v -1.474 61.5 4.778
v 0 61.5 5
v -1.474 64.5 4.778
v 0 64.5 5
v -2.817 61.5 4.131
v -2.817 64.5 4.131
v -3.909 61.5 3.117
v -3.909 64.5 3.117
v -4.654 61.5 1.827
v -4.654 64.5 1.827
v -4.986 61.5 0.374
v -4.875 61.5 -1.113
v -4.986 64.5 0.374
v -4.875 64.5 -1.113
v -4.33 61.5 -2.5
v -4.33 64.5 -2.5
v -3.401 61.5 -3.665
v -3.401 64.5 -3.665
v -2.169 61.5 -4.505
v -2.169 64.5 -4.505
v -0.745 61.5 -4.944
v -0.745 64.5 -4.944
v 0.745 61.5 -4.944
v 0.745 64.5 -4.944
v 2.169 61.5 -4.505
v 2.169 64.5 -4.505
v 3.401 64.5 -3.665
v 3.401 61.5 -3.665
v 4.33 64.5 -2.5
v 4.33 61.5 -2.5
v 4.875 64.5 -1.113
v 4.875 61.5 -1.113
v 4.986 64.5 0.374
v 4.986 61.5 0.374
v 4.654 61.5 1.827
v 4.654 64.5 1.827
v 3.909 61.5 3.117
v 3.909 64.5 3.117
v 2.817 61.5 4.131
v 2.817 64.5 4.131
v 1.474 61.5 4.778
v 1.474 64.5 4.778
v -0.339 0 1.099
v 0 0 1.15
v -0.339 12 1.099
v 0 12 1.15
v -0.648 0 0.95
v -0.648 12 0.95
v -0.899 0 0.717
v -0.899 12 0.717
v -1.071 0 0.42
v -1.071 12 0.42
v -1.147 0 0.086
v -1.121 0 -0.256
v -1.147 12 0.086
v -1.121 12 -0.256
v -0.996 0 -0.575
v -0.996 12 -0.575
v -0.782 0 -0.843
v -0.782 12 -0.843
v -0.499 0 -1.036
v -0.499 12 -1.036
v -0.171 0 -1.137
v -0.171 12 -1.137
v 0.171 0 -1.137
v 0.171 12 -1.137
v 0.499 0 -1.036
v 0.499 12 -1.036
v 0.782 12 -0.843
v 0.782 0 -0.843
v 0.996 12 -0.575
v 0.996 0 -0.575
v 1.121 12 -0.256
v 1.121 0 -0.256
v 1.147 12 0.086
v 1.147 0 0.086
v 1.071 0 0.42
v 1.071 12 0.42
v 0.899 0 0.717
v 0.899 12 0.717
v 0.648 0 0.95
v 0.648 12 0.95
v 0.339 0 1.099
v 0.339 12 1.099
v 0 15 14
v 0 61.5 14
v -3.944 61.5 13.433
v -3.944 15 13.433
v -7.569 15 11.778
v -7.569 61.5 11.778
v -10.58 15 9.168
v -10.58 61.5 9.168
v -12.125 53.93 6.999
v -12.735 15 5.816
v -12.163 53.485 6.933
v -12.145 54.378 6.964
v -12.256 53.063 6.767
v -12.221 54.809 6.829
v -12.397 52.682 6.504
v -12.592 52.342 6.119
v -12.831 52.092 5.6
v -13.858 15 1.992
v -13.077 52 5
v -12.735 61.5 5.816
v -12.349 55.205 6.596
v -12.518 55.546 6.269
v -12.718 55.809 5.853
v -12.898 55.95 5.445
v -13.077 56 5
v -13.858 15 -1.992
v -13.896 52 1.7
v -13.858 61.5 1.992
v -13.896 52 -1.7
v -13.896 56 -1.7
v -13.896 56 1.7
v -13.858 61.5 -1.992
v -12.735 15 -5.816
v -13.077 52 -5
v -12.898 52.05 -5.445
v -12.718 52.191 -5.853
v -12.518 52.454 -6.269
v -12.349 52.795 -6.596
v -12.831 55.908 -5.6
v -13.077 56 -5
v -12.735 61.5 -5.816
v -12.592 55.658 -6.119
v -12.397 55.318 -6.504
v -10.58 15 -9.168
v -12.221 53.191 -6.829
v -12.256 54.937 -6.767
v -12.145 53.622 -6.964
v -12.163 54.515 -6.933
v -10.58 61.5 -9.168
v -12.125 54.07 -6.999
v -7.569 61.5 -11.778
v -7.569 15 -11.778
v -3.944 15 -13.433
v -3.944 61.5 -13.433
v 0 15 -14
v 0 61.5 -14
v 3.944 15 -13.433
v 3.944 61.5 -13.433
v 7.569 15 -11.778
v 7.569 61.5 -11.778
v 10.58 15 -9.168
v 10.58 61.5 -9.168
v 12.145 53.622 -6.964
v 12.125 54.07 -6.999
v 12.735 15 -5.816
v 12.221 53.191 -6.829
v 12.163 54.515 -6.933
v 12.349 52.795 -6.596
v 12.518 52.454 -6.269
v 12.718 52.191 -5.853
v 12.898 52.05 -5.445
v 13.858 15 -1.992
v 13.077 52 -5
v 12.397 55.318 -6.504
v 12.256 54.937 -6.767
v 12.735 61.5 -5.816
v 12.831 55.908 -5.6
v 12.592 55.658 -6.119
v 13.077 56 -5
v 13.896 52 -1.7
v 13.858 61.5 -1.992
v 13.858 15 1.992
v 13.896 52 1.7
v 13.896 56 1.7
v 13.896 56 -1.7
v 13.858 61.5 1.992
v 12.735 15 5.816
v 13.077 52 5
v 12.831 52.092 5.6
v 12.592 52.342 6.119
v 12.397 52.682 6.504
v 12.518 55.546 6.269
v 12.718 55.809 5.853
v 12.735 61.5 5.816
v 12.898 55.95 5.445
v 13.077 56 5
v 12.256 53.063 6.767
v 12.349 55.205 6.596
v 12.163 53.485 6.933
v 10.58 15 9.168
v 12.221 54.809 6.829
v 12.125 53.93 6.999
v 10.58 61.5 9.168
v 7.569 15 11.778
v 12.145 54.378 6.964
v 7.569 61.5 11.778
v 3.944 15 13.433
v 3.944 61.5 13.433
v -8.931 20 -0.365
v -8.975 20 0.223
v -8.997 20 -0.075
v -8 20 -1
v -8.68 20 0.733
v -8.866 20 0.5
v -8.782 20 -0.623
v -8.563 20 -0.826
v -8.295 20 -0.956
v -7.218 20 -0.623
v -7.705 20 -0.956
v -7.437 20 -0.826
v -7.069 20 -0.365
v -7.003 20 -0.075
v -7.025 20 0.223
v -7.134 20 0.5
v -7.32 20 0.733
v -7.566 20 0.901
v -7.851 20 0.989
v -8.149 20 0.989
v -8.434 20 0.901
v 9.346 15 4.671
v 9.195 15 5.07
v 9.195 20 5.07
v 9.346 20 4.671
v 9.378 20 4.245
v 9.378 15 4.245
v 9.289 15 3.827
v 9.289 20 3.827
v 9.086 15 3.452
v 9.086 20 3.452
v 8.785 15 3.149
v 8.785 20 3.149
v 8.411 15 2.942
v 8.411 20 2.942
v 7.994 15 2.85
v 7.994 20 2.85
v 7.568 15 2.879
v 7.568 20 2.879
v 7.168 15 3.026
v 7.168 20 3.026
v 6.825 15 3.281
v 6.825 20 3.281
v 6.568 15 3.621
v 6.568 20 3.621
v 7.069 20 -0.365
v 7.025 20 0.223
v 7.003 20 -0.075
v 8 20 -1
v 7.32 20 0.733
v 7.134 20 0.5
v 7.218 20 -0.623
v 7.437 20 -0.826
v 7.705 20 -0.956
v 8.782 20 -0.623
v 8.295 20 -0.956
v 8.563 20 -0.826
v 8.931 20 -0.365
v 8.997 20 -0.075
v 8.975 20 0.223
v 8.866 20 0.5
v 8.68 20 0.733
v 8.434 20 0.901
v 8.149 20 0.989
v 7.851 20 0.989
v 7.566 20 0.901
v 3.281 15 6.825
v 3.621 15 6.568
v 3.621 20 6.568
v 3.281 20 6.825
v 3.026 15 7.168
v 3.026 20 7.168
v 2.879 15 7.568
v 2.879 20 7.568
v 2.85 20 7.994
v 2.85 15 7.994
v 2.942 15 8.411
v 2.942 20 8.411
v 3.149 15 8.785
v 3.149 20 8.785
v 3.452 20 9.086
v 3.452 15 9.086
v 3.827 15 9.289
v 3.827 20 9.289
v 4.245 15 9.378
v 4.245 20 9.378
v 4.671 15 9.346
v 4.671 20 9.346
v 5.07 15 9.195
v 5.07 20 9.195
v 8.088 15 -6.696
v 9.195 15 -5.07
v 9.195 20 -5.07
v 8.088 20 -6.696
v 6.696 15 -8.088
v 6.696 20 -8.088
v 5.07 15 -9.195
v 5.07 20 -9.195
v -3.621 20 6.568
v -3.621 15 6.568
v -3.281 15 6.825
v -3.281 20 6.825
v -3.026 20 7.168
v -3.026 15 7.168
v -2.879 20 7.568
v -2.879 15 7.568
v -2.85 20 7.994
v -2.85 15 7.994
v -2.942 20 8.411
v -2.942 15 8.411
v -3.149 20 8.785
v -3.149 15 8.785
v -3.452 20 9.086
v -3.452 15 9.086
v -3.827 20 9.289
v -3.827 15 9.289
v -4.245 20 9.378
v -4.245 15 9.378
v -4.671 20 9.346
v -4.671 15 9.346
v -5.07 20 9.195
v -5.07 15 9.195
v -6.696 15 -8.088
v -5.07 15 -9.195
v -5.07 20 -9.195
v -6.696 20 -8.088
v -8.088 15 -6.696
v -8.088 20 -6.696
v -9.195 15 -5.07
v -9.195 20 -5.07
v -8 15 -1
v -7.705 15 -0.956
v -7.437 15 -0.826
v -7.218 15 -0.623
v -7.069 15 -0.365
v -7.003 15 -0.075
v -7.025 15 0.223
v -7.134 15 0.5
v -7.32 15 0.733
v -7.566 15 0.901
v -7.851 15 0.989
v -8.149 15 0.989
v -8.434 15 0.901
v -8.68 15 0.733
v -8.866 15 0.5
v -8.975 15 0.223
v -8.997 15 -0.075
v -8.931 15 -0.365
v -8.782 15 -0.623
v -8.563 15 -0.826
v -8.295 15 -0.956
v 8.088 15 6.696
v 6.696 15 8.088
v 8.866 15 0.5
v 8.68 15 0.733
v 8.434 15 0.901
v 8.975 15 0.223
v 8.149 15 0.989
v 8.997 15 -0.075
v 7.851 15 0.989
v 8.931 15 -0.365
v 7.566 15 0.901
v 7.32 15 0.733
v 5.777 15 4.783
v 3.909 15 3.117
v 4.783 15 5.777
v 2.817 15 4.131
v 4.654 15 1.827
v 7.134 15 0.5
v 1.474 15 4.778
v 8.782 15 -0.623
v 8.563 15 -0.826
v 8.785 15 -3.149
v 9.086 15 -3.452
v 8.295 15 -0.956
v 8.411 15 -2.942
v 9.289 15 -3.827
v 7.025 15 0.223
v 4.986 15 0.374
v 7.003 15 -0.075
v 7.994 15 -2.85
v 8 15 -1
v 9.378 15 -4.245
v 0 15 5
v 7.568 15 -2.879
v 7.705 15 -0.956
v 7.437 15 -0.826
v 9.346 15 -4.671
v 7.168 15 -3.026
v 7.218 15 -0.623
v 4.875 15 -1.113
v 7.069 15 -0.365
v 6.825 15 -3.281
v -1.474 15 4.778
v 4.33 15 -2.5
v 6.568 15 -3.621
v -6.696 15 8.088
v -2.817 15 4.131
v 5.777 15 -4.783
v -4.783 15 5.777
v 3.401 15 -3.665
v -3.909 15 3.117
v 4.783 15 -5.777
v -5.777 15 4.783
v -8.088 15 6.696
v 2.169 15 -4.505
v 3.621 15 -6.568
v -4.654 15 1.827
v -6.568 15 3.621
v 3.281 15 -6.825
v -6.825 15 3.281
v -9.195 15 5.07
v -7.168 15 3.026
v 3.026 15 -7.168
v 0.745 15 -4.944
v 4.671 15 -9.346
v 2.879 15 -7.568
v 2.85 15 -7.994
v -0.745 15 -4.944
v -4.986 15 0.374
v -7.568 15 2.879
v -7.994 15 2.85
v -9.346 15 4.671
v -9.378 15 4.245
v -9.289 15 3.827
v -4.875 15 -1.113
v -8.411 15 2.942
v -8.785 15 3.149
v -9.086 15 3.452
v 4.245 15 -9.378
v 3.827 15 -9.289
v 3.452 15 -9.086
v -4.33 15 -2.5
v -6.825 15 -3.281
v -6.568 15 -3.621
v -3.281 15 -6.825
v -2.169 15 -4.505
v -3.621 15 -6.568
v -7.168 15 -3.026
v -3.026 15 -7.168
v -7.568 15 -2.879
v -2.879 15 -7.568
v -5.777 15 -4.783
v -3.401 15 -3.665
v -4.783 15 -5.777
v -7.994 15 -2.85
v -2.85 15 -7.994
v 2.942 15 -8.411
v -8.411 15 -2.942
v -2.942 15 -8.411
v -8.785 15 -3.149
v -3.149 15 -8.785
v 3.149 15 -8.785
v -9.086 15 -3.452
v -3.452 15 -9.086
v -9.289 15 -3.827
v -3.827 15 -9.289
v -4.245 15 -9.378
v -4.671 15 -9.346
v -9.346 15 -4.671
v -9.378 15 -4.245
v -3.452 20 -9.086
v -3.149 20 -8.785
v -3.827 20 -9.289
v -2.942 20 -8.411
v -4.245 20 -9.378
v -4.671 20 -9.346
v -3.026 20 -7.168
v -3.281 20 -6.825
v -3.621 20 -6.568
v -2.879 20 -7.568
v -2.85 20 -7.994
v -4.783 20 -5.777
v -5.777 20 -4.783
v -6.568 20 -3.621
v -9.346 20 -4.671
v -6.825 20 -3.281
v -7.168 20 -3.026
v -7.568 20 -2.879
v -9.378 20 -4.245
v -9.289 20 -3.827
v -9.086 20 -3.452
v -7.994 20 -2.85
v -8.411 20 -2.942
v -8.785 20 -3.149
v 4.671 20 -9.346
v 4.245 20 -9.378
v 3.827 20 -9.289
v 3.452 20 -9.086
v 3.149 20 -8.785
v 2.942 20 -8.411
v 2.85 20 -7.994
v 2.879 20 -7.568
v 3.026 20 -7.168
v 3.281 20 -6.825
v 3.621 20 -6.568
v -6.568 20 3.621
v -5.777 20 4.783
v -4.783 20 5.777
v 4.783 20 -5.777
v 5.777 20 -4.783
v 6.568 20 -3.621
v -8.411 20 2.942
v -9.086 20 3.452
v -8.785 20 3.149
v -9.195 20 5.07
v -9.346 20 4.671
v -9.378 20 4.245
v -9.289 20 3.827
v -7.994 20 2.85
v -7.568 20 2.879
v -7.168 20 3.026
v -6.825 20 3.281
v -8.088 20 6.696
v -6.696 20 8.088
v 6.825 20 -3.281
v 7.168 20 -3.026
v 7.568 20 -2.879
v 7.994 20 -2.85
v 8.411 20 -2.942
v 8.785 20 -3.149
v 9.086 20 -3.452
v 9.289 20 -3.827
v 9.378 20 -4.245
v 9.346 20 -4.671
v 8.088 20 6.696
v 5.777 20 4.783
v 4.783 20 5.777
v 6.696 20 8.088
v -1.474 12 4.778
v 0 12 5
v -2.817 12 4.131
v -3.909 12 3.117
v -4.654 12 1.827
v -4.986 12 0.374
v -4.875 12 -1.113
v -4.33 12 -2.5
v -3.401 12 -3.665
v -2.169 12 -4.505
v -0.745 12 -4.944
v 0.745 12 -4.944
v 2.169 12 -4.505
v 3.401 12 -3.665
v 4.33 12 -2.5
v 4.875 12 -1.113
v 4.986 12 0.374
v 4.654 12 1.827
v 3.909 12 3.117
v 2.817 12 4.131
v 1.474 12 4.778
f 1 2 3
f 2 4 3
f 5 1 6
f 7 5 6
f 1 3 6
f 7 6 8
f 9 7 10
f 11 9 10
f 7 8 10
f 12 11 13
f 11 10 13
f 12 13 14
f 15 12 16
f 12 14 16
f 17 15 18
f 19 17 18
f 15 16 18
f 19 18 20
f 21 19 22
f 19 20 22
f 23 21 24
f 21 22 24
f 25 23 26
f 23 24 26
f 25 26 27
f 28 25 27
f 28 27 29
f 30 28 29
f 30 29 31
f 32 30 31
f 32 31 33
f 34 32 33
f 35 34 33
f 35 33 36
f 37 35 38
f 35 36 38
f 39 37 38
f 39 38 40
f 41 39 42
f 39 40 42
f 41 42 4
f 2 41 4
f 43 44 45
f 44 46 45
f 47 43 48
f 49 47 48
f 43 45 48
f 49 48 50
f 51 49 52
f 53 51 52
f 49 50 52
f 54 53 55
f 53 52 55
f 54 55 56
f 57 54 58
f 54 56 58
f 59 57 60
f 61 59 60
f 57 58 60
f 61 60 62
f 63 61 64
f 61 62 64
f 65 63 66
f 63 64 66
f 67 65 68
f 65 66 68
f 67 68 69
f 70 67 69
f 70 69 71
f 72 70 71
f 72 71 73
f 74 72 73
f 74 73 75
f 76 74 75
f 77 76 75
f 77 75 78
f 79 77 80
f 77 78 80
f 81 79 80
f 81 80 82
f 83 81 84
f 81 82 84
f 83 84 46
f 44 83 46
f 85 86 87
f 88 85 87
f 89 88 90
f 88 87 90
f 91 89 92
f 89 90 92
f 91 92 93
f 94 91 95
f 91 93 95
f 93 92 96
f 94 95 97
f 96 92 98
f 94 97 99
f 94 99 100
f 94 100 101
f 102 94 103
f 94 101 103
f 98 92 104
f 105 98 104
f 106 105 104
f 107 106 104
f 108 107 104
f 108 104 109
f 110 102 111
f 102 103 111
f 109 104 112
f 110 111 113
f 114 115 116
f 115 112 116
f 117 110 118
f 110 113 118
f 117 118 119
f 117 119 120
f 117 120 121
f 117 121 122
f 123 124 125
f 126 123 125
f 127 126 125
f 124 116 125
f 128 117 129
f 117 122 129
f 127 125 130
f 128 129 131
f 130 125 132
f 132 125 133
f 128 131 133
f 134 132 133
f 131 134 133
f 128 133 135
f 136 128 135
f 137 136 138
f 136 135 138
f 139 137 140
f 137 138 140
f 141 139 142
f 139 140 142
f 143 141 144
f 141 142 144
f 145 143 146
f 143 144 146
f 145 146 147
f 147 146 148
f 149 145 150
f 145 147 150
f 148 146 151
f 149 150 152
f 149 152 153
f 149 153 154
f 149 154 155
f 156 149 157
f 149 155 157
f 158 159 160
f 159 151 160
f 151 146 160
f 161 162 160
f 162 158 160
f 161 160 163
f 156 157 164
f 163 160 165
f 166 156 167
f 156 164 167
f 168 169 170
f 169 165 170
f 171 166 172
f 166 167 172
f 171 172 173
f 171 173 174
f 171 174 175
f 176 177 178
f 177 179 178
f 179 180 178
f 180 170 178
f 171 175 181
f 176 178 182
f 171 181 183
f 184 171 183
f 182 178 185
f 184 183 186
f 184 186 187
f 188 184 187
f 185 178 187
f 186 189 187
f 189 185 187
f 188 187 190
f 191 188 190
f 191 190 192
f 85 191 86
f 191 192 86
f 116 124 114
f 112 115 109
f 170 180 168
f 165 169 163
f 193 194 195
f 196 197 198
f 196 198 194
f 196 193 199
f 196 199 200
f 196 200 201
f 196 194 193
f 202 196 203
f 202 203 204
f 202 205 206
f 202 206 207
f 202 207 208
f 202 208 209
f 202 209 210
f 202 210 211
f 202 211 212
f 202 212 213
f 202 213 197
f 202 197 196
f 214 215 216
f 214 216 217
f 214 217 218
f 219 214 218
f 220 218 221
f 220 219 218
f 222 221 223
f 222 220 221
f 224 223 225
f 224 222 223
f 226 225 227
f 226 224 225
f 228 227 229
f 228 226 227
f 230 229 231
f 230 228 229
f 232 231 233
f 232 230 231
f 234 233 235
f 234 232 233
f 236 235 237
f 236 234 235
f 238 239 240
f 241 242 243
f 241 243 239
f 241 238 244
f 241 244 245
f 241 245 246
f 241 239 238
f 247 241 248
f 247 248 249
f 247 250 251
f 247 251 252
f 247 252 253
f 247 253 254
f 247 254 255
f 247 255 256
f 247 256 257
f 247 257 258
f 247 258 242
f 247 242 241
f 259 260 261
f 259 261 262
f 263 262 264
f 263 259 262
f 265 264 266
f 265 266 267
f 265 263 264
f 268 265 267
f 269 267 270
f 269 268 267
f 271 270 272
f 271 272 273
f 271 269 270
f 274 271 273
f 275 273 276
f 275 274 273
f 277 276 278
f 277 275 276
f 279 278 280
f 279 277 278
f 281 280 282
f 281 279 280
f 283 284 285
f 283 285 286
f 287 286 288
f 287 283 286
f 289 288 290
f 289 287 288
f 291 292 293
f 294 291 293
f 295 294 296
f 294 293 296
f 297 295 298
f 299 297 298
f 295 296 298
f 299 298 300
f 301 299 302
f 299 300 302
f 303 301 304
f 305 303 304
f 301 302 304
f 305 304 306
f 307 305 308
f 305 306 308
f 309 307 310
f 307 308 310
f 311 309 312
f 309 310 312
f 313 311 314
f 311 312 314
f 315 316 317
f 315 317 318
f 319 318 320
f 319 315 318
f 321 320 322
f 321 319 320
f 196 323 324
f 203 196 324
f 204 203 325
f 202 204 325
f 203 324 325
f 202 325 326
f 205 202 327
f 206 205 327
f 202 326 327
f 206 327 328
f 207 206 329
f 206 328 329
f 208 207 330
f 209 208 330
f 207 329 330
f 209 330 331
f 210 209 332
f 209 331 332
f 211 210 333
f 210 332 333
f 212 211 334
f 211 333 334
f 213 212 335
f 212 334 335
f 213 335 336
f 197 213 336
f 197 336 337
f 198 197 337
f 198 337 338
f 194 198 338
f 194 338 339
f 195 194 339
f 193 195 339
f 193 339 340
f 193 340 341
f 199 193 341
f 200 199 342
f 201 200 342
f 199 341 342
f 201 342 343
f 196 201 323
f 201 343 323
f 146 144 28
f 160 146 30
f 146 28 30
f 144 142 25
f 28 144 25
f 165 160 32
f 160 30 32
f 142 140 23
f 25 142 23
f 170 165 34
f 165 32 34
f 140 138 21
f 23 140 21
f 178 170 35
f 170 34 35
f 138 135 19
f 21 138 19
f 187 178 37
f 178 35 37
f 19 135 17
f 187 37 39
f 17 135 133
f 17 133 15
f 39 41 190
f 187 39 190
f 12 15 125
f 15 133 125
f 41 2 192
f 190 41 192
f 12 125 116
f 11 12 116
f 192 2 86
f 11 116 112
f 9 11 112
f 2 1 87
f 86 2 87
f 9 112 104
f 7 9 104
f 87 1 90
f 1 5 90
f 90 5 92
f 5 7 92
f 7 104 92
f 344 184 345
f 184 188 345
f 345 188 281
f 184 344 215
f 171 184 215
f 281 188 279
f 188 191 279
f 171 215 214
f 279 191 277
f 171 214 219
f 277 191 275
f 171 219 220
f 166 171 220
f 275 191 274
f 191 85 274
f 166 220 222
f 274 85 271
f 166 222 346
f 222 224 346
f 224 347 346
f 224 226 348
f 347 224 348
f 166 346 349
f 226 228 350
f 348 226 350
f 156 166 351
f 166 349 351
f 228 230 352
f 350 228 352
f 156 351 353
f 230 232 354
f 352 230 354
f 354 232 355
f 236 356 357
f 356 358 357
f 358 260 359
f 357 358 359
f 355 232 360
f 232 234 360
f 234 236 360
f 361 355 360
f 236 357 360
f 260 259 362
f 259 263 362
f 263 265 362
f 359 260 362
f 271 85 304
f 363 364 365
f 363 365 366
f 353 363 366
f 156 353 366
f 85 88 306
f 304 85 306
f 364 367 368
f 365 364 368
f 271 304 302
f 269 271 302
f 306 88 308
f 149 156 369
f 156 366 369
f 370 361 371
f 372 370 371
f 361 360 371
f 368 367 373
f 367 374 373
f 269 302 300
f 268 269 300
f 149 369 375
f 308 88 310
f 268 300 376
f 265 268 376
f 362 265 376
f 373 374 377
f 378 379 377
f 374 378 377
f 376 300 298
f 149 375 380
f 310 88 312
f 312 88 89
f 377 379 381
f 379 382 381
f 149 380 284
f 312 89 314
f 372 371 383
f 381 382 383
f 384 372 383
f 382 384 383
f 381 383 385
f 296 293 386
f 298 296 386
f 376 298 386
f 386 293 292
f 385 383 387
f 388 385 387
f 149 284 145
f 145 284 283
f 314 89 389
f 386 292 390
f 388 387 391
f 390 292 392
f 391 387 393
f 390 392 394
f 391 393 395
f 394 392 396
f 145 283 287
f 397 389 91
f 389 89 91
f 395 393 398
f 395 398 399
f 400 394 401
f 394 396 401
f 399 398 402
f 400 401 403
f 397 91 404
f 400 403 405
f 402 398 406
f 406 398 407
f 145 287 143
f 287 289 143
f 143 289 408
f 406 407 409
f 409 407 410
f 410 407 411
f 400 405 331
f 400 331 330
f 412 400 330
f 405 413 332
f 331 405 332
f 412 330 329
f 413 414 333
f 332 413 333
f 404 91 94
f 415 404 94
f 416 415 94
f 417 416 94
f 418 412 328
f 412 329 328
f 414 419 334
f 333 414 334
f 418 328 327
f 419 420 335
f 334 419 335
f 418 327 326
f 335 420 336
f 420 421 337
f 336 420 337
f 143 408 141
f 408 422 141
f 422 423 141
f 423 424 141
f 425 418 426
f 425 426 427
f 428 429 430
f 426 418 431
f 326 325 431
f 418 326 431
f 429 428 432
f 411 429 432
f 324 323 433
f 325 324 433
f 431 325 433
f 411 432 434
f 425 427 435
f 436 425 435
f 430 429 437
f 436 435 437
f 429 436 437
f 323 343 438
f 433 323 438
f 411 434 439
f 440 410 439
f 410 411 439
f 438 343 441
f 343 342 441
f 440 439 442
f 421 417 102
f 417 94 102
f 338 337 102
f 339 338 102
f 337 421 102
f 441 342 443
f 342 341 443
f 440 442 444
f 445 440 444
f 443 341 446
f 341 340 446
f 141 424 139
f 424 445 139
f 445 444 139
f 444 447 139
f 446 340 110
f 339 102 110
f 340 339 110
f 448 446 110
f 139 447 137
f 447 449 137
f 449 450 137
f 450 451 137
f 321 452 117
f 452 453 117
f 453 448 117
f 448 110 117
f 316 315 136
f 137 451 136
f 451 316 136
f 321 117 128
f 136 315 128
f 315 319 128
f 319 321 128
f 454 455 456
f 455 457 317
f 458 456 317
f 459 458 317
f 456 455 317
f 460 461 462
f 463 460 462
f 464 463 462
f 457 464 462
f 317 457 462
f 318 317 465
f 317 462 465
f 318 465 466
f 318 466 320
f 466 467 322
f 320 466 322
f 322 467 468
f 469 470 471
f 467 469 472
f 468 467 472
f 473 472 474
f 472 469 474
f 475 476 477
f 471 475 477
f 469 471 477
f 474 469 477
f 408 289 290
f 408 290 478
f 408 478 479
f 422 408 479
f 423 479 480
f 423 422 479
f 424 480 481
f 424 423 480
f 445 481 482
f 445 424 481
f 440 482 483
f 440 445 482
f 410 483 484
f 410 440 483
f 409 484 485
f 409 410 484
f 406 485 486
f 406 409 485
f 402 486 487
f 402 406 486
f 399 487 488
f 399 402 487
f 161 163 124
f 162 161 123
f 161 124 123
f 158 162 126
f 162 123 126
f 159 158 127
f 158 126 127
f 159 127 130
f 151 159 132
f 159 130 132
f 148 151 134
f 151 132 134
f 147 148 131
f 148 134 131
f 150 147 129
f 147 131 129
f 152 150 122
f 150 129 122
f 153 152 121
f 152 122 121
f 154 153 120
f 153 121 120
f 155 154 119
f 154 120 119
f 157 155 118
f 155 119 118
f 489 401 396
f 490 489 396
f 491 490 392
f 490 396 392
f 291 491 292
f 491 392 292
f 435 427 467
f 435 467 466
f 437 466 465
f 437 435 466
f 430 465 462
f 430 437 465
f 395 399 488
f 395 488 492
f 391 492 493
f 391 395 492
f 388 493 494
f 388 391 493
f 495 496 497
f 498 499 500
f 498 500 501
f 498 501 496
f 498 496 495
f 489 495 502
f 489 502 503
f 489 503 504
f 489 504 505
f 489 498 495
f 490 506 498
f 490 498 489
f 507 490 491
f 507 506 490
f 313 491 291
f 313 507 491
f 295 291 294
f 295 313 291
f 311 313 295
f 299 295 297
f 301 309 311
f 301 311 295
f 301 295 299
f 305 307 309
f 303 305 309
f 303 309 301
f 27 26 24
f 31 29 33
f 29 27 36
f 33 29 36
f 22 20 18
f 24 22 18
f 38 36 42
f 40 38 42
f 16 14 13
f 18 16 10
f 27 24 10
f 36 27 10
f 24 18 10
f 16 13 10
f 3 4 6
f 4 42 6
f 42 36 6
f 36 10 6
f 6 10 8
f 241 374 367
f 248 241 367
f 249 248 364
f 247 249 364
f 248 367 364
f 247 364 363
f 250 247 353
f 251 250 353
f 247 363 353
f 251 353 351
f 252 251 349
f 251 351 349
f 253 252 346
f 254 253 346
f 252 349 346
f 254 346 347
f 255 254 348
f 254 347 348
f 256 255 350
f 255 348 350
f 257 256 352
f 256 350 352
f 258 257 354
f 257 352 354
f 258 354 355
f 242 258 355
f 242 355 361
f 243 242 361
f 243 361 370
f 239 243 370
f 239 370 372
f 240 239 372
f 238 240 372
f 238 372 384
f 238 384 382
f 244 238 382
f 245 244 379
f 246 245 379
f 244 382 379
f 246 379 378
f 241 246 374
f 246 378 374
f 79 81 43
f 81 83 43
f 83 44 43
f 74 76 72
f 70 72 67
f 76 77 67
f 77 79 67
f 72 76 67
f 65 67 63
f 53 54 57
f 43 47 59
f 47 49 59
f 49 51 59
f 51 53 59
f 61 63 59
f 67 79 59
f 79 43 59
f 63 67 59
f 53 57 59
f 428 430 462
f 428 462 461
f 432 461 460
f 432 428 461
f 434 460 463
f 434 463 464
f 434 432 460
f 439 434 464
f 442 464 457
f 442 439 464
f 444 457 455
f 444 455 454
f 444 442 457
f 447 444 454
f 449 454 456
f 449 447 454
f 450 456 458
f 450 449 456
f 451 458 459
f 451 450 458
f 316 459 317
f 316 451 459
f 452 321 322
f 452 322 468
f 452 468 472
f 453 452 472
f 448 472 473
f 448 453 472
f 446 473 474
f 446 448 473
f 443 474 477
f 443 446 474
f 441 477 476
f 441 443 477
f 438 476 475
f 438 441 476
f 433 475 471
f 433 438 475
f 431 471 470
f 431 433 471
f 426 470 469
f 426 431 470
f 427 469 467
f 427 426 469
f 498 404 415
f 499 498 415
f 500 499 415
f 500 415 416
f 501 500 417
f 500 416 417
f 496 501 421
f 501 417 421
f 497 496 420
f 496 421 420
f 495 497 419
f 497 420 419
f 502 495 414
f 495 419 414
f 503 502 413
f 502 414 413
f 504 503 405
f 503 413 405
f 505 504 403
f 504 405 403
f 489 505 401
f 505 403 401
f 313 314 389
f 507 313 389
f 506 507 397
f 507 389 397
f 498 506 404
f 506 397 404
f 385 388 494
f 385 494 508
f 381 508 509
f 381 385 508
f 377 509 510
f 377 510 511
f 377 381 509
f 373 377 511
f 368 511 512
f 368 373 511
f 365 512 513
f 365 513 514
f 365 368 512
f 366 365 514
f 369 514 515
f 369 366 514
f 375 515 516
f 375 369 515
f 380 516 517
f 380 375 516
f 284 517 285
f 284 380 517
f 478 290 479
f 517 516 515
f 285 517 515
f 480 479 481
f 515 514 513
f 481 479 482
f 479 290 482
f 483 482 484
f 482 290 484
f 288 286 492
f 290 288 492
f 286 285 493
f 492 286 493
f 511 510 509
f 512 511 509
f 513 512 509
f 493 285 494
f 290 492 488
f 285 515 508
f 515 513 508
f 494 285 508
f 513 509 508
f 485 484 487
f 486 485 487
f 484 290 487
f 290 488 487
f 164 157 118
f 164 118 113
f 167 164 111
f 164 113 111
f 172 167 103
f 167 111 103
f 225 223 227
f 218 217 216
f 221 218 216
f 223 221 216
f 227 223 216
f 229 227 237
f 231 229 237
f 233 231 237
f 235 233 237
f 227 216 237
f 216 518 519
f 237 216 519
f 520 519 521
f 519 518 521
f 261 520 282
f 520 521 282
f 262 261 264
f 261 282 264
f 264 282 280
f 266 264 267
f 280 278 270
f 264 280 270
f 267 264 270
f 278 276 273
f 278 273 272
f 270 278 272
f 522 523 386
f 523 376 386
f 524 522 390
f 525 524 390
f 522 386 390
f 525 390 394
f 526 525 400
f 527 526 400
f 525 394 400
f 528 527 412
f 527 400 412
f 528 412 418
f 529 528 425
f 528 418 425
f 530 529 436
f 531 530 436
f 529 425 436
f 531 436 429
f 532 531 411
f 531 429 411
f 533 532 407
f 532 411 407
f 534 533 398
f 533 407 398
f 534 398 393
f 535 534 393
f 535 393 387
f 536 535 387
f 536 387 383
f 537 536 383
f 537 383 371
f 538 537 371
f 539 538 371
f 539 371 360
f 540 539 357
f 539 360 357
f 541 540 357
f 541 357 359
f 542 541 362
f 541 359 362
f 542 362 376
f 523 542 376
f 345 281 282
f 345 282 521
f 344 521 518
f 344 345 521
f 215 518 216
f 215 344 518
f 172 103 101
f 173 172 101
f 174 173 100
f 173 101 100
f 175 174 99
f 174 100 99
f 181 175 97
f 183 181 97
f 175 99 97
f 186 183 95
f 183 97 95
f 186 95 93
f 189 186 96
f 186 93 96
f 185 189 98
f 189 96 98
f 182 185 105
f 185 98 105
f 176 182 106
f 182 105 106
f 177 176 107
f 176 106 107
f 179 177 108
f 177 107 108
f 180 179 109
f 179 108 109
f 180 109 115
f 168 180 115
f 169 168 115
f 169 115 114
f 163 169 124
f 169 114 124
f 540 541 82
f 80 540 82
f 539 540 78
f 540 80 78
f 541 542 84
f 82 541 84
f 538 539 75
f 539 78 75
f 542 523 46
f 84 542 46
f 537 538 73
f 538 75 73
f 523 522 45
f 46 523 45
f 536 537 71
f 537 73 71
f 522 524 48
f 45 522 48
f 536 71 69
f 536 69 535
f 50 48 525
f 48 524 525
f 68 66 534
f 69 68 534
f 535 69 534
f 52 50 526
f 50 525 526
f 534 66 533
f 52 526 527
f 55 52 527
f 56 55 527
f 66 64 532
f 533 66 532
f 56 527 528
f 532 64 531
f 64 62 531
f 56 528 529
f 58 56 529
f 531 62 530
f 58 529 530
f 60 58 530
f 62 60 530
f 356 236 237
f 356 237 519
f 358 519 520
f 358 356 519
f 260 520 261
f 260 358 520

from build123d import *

# Parameters (mm, degrees)
SKETCH2_R               = 1
CUT_EXTRUDE1_DEPTH      = 5
CUT_EXTRUDE2_DEPTH      = 5
CUT_EXTRUDE3_DEPTH      = 68.470363864
CUT_EXTRUDE3_DEPTH_BACK = 68.470363864


with BuildPart() as part:
    # Sketch1 → Revolve1 (revolve)
    with BuildSketch(Plane(origin=(0, 0, 0), x_dir=(0, 0, -1), z_dir=(1, 0, 0)), mode=Mode.PRIVATE) as revolve1_sk:
        Polygon((0, 0), (1.15, 0), (1.15, 12), (5, 12), (5, 15), (14, 15), (14, 61.5), (5, 61.5), (5, 64.5), (0, 64.5), align=None)
    revolve(revolve1_sk.sketch.rotate(Axis((0, 64.5, 0), (0, -1, 0)), 180), axis=Axis((0, 64.5, 0), (0, -1, 0)))

    # Sketch2 → Cut-Extrude1 (cut)
    with BuildSketch(Plane.XZ.offset(-15)):
        with Locations(Location((-8, 0, 0), (0, 0, 270))):
            Circle(SKETCH2_R)
        with Locations(Location((8, 0, 0), (0, 0, 270))):
            Circle(SKETCH2_R)
    extrude(amount=-CUT_EXTRUDE1_DEPTH, mode=Mode.SUBTRACT)

    # Sketch3 → Cut-Extrude2 (cut)
    with BuildSketch(Plane.XZ.offset(-15)):
        with BuildLine():
            ThreePointArc((-5.070033124, 9.19482268), (-7.424621202, 7.424621202), (-9.19482268, 5.070033124))
            ThreePointArc((-9.19482268, 5.070033124), (-8.60556703, 3.03219658), (-6.567730486, 3.621452231))
            ThreePointArc((-6.567730486, 3.621452231), (-5.303300859, 5.303300859), (-3.621452231, 6.567730486))
            ThreePointArc((-3.621452231, 6.567730486), (-3.03219658, 8.60556703), (-5.070033124, 9.19482268))
        make_face()
        with BuildLine():
            ThreePointArc((6.567730486, 3.621452231), (5.303300859, 5.303300859), (3.621452231, 6.567730486))
            ThreePointArc((3.621452231, 6.567730486), (3.03219658, 8.60556703), (5.070033124, 9.19482268))
            ThreePointArc((5.070033124, 9.19482268), (7.424621202, 7.424621202), (9.19482268, 5.070033124))
            ThreePointArc((9.19482268, 5.070033124), (8.60556703, 3.03219658), (6.567730486, 3.621452231))
        make_face()
        with BuildLine():
            ThreePointArc((3.621452231, -6.567730486), (5.303300859, -5.303300859), (6.567730486, -3.621452231))
            ThreePointArc((6.567730486, -3.621452231), (8.60556703, -3.03219658), (9.19482268, -5.070033124))
            ThreePointArc((9.19482268, -5.070033124), (7.424621202, -7.424621202), (5.070033124, -9.19482268))
            ThreePointArc((5.070033124, -9.19482268), (3.03219658, -8.60556703), (3.621452231, -6.567730486))
        make_face()
        with BuildLine():
            ThreePointArc((-6.567730486, -3.621452231), (-5.303300859, -5.303300859), (-3.621452231, -6.567730486))
            ThreePointArc((-3.621452231, -6.567730486), (-3.03219658, -8.60556703), (-5.070033124, -9.19482268))
            ThreePointArc((-5.070033124, -9.19482268), (-7.424621202, -7.424621202), (-9.19482268, -5.070033124))
            ThreePointArc((-9.19482268, -5.070033124), (-8.60556703, -3.03219658), (-6.567730486, -3.621452231))
        make_face()
    extrude(amount=-CUT_EXTRUDE2_DEPTH, mode=Mode.SUBTRACT)

    # Sketch4 → Cut-Extrude3 (cut, two sides: drawn at the far end of the back side and taken through both)
    with BuildSketch(Plane(origin=(0, 0, 0), x_dir=(0, 0, -1), z_dir=(1, 0, 0)).offset(-CUT_EXTRUDE3_DEPTH_BACK)):
        with BuildLine():
            Line((-5, 56), (5, 56))
            ThreePointArc((5, 56), (7, 54), (5, 52))
            Line((5, 52), (-5, 52))
            ThreePointArc((-5, 52), (-7, 54), (-5, 56))
        make_face()
    extrude(amount=CUT_EXTRUDE3_DEPTH + CUT_EXTRUDE3_DEPTH_BACK, mode=Mode.SUBTRACT)


solid = part.part
